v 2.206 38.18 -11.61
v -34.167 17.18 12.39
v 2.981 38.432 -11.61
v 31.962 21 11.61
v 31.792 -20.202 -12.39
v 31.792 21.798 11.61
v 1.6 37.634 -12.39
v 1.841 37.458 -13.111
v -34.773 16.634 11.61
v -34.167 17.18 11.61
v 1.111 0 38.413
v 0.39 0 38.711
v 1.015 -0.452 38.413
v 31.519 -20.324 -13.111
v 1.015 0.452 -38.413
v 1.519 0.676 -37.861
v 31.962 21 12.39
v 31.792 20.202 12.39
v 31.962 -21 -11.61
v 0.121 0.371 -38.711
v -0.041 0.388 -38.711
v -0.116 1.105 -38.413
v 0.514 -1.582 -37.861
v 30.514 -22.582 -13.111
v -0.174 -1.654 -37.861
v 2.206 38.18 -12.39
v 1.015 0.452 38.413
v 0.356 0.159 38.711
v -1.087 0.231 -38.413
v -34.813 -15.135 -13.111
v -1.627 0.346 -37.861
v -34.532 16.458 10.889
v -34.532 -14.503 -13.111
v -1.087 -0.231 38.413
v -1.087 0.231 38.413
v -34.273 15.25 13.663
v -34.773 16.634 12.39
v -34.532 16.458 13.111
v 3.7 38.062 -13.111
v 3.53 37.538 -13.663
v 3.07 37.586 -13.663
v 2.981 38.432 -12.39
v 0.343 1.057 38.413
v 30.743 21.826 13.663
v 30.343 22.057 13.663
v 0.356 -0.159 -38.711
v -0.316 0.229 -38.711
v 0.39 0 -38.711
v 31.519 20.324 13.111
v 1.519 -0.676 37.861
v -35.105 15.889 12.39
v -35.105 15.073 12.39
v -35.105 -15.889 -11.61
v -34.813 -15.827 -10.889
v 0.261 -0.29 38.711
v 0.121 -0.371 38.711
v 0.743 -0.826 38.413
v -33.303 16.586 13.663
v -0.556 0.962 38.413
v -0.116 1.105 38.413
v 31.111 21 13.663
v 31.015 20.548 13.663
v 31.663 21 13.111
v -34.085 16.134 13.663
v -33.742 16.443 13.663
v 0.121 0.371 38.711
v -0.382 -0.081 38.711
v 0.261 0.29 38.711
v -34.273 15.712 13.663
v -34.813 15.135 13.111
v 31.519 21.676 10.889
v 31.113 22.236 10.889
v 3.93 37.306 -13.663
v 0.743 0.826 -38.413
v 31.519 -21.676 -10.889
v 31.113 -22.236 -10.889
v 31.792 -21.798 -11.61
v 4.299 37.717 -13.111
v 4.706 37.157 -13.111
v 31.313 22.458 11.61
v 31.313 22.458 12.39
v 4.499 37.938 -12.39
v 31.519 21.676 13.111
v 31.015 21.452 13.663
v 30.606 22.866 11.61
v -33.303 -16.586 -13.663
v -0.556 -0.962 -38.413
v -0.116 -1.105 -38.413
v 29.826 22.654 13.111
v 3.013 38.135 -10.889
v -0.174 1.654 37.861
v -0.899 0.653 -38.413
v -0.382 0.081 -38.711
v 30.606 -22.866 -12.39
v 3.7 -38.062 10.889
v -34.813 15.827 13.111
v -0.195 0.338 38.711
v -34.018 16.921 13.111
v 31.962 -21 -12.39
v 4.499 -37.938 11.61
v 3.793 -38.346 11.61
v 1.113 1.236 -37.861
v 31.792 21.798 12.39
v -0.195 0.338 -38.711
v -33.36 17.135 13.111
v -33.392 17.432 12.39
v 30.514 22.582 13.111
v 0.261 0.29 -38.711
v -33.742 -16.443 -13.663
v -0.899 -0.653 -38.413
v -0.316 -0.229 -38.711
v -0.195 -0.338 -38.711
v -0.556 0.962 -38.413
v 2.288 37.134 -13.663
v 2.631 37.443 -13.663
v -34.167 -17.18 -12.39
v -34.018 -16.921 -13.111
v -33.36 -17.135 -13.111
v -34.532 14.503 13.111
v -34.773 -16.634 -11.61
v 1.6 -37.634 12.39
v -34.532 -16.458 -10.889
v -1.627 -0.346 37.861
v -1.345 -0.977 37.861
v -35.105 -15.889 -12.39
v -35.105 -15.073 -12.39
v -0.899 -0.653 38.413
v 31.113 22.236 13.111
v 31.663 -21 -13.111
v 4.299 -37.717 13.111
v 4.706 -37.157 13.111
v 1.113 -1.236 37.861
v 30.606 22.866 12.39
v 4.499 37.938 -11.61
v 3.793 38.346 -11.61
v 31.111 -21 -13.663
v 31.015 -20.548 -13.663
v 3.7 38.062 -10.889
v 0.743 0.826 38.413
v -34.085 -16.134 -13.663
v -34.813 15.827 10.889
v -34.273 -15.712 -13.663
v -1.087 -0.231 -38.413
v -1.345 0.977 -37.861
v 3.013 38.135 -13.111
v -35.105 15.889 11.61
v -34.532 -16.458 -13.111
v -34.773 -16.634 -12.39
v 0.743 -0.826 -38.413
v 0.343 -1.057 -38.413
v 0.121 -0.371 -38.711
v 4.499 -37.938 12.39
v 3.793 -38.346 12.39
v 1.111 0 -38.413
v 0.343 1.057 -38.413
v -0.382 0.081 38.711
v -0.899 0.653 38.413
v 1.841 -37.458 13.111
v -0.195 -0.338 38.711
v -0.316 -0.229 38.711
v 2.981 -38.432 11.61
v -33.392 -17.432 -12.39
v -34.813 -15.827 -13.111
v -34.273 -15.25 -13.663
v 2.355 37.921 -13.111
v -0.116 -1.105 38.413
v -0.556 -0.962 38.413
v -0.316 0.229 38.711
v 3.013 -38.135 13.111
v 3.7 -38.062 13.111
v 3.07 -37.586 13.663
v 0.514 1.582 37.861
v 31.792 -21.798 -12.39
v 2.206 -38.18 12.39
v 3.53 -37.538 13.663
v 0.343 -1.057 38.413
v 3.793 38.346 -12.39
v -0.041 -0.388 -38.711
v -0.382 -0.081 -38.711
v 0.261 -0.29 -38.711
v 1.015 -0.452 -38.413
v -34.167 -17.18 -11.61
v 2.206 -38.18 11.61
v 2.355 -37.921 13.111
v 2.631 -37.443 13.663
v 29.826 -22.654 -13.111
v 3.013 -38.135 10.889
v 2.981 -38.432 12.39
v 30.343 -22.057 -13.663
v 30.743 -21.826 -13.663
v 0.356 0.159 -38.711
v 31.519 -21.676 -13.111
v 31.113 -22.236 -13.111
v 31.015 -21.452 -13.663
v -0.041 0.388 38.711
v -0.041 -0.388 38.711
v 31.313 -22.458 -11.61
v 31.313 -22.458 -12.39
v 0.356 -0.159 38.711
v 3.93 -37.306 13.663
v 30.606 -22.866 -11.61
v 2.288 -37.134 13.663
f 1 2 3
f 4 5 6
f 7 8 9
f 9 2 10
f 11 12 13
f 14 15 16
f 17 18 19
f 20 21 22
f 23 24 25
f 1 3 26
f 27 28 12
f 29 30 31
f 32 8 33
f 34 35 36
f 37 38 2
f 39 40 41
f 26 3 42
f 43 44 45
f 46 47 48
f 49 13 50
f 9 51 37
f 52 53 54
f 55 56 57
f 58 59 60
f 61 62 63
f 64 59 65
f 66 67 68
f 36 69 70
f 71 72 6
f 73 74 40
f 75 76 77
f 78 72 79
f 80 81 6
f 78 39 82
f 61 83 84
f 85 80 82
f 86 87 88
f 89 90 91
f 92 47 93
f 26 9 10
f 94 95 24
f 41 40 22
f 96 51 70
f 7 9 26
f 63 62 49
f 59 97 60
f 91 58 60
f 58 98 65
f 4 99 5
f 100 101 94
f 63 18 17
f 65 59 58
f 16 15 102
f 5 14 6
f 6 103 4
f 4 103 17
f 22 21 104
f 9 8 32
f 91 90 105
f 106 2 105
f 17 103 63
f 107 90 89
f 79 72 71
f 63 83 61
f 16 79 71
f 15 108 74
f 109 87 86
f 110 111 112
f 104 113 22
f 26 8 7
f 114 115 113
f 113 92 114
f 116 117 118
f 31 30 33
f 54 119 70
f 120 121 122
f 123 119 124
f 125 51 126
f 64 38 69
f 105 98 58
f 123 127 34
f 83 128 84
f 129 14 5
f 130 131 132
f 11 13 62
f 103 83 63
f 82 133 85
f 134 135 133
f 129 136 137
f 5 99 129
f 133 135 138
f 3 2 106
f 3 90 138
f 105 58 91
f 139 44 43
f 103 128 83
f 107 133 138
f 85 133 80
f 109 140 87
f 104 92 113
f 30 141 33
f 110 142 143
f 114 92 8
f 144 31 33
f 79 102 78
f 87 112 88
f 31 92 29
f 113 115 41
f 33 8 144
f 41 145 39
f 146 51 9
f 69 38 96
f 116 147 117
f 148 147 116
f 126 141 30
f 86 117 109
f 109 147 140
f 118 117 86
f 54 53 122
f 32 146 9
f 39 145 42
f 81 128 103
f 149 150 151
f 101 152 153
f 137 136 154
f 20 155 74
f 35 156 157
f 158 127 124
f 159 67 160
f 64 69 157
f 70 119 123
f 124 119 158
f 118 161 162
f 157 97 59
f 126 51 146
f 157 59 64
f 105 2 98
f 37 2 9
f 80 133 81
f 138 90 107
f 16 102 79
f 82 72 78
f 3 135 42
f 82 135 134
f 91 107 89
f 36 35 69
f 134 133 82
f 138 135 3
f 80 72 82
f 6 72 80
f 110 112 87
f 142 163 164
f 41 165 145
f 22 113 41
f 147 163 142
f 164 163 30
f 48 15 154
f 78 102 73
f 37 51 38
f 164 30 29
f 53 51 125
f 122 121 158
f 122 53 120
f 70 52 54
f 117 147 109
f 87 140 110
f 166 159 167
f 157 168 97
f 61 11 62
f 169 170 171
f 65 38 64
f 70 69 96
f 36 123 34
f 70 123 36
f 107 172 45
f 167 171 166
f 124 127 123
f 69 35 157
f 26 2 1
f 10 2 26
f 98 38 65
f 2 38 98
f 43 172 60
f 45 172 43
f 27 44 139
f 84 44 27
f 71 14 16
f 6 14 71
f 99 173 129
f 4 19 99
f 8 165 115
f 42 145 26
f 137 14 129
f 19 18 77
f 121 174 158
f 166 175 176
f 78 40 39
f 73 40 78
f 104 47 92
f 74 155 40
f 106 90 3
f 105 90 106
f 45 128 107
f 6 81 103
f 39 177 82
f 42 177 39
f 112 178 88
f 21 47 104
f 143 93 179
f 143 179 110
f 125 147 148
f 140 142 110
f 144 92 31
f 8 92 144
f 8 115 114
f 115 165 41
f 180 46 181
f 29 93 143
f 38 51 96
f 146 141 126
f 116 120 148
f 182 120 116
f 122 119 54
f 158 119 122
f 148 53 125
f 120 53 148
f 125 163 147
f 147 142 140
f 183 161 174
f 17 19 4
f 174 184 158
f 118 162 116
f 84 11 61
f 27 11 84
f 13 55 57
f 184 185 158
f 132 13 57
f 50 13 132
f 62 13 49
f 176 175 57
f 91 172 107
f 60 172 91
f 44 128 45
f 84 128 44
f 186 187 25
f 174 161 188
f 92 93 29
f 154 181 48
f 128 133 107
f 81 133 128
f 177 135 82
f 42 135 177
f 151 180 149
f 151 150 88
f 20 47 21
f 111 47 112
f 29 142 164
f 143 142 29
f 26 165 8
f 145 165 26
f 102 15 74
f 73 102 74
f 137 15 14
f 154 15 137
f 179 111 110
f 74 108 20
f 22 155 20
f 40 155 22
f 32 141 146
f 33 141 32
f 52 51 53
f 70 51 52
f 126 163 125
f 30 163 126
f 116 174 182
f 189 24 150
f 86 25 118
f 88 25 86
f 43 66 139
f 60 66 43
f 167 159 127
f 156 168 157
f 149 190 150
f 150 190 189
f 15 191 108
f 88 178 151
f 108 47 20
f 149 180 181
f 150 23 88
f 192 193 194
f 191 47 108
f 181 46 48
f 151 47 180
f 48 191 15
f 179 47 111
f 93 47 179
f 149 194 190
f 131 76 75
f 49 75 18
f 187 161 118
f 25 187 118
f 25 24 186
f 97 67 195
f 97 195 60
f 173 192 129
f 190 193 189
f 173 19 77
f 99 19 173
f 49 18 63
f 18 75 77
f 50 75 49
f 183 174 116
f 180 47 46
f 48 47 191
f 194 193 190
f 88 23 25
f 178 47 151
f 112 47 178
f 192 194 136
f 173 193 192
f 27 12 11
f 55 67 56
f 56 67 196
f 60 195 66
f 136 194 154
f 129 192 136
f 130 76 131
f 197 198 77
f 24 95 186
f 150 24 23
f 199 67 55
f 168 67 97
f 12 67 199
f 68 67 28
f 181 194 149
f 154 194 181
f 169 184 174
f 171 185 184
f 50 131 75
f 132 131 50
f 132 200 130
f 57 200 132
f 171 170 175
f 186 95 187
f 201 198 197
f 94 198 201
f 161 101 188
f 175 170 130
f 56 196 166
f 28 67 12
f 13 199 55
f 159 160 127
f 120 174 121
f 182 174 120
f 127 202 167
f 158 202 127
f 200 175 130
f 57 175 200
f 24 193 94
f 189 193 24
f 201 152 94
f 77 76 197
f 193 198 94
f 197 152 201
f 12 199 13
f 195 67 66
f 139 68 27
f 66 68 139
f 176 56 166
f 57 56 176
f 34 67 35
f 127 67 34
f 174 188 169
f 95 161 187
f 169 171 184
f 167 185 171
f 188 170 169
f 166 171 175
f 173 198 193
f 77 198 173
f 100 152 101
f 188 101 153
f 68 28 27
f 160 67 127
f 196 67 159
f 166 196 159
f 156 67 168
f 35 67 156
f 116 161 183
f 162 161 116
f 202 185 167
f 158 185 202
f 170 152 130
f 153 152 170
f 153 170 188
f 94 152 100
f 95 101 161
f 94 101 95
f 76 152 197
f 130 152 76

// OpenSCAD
/* parametric asymmetric trigonal trapezohdron
   geometry from Matlab code by https://twitter.com/etzpcm
   Paul Matthews , Nottingham Uni 
     
*/

// Initial point
//x0
x0 = 1;
//y0
y0 = 0.7;
//z0
z0 = 0.4;
//scale 
scale=30;
//corner radius
radius =2;
// corner resolution
corner_resolution = 15;


m1= [[1,0,0], [0,-1,0], [0,0,-1]];   // 180 rotation about x axis
t=2*180/3;
c=cos(t);
s=sin(t);
m2= [ [c,s,0], [-s,c,0], [0,0,1]];   // 120 rotation about z axis

p0= [x0,y0,z0];  
//Ensure 4 face points are coplanar 
z = z0*(-s*x0+(c-1)*y0)*x0/((c-1)*x0+s*y0)/y0;

p1= m2 * p0;
p2= m2 * p1;
p3= m1 * p0;
p4= m2 * p3;
p5= m2 * p4;
p6 = [0,0,z];
p7 = [0,0,-z];
unit_vertices = [p0,p1,p2,p3,p4,p5,p6,p7];
vertices = [for (v=unit_vertices) v* scale];

// faces 2 and 3 reversed to get all faces with the same orientation
// faces reordered so face[i] has i+1 pips

faces = [[0,3,1,6], 
         [5,7,3,0],  
         [2,5,0,6],  
         [1,3,7,4], 
         [4,2,6,1], 
         [4,7,5,2], 
        ];

dice(vertices,faces,radius) ;

module dice(vertices,faces,radius) {
       if(radius==0)
           polyhedron(vertices,faces);
       else hull() 
             for (v = vertices) 
                  translate(v) 
                     sphere(radius, $fn=corner_resolution);    
 };
 
